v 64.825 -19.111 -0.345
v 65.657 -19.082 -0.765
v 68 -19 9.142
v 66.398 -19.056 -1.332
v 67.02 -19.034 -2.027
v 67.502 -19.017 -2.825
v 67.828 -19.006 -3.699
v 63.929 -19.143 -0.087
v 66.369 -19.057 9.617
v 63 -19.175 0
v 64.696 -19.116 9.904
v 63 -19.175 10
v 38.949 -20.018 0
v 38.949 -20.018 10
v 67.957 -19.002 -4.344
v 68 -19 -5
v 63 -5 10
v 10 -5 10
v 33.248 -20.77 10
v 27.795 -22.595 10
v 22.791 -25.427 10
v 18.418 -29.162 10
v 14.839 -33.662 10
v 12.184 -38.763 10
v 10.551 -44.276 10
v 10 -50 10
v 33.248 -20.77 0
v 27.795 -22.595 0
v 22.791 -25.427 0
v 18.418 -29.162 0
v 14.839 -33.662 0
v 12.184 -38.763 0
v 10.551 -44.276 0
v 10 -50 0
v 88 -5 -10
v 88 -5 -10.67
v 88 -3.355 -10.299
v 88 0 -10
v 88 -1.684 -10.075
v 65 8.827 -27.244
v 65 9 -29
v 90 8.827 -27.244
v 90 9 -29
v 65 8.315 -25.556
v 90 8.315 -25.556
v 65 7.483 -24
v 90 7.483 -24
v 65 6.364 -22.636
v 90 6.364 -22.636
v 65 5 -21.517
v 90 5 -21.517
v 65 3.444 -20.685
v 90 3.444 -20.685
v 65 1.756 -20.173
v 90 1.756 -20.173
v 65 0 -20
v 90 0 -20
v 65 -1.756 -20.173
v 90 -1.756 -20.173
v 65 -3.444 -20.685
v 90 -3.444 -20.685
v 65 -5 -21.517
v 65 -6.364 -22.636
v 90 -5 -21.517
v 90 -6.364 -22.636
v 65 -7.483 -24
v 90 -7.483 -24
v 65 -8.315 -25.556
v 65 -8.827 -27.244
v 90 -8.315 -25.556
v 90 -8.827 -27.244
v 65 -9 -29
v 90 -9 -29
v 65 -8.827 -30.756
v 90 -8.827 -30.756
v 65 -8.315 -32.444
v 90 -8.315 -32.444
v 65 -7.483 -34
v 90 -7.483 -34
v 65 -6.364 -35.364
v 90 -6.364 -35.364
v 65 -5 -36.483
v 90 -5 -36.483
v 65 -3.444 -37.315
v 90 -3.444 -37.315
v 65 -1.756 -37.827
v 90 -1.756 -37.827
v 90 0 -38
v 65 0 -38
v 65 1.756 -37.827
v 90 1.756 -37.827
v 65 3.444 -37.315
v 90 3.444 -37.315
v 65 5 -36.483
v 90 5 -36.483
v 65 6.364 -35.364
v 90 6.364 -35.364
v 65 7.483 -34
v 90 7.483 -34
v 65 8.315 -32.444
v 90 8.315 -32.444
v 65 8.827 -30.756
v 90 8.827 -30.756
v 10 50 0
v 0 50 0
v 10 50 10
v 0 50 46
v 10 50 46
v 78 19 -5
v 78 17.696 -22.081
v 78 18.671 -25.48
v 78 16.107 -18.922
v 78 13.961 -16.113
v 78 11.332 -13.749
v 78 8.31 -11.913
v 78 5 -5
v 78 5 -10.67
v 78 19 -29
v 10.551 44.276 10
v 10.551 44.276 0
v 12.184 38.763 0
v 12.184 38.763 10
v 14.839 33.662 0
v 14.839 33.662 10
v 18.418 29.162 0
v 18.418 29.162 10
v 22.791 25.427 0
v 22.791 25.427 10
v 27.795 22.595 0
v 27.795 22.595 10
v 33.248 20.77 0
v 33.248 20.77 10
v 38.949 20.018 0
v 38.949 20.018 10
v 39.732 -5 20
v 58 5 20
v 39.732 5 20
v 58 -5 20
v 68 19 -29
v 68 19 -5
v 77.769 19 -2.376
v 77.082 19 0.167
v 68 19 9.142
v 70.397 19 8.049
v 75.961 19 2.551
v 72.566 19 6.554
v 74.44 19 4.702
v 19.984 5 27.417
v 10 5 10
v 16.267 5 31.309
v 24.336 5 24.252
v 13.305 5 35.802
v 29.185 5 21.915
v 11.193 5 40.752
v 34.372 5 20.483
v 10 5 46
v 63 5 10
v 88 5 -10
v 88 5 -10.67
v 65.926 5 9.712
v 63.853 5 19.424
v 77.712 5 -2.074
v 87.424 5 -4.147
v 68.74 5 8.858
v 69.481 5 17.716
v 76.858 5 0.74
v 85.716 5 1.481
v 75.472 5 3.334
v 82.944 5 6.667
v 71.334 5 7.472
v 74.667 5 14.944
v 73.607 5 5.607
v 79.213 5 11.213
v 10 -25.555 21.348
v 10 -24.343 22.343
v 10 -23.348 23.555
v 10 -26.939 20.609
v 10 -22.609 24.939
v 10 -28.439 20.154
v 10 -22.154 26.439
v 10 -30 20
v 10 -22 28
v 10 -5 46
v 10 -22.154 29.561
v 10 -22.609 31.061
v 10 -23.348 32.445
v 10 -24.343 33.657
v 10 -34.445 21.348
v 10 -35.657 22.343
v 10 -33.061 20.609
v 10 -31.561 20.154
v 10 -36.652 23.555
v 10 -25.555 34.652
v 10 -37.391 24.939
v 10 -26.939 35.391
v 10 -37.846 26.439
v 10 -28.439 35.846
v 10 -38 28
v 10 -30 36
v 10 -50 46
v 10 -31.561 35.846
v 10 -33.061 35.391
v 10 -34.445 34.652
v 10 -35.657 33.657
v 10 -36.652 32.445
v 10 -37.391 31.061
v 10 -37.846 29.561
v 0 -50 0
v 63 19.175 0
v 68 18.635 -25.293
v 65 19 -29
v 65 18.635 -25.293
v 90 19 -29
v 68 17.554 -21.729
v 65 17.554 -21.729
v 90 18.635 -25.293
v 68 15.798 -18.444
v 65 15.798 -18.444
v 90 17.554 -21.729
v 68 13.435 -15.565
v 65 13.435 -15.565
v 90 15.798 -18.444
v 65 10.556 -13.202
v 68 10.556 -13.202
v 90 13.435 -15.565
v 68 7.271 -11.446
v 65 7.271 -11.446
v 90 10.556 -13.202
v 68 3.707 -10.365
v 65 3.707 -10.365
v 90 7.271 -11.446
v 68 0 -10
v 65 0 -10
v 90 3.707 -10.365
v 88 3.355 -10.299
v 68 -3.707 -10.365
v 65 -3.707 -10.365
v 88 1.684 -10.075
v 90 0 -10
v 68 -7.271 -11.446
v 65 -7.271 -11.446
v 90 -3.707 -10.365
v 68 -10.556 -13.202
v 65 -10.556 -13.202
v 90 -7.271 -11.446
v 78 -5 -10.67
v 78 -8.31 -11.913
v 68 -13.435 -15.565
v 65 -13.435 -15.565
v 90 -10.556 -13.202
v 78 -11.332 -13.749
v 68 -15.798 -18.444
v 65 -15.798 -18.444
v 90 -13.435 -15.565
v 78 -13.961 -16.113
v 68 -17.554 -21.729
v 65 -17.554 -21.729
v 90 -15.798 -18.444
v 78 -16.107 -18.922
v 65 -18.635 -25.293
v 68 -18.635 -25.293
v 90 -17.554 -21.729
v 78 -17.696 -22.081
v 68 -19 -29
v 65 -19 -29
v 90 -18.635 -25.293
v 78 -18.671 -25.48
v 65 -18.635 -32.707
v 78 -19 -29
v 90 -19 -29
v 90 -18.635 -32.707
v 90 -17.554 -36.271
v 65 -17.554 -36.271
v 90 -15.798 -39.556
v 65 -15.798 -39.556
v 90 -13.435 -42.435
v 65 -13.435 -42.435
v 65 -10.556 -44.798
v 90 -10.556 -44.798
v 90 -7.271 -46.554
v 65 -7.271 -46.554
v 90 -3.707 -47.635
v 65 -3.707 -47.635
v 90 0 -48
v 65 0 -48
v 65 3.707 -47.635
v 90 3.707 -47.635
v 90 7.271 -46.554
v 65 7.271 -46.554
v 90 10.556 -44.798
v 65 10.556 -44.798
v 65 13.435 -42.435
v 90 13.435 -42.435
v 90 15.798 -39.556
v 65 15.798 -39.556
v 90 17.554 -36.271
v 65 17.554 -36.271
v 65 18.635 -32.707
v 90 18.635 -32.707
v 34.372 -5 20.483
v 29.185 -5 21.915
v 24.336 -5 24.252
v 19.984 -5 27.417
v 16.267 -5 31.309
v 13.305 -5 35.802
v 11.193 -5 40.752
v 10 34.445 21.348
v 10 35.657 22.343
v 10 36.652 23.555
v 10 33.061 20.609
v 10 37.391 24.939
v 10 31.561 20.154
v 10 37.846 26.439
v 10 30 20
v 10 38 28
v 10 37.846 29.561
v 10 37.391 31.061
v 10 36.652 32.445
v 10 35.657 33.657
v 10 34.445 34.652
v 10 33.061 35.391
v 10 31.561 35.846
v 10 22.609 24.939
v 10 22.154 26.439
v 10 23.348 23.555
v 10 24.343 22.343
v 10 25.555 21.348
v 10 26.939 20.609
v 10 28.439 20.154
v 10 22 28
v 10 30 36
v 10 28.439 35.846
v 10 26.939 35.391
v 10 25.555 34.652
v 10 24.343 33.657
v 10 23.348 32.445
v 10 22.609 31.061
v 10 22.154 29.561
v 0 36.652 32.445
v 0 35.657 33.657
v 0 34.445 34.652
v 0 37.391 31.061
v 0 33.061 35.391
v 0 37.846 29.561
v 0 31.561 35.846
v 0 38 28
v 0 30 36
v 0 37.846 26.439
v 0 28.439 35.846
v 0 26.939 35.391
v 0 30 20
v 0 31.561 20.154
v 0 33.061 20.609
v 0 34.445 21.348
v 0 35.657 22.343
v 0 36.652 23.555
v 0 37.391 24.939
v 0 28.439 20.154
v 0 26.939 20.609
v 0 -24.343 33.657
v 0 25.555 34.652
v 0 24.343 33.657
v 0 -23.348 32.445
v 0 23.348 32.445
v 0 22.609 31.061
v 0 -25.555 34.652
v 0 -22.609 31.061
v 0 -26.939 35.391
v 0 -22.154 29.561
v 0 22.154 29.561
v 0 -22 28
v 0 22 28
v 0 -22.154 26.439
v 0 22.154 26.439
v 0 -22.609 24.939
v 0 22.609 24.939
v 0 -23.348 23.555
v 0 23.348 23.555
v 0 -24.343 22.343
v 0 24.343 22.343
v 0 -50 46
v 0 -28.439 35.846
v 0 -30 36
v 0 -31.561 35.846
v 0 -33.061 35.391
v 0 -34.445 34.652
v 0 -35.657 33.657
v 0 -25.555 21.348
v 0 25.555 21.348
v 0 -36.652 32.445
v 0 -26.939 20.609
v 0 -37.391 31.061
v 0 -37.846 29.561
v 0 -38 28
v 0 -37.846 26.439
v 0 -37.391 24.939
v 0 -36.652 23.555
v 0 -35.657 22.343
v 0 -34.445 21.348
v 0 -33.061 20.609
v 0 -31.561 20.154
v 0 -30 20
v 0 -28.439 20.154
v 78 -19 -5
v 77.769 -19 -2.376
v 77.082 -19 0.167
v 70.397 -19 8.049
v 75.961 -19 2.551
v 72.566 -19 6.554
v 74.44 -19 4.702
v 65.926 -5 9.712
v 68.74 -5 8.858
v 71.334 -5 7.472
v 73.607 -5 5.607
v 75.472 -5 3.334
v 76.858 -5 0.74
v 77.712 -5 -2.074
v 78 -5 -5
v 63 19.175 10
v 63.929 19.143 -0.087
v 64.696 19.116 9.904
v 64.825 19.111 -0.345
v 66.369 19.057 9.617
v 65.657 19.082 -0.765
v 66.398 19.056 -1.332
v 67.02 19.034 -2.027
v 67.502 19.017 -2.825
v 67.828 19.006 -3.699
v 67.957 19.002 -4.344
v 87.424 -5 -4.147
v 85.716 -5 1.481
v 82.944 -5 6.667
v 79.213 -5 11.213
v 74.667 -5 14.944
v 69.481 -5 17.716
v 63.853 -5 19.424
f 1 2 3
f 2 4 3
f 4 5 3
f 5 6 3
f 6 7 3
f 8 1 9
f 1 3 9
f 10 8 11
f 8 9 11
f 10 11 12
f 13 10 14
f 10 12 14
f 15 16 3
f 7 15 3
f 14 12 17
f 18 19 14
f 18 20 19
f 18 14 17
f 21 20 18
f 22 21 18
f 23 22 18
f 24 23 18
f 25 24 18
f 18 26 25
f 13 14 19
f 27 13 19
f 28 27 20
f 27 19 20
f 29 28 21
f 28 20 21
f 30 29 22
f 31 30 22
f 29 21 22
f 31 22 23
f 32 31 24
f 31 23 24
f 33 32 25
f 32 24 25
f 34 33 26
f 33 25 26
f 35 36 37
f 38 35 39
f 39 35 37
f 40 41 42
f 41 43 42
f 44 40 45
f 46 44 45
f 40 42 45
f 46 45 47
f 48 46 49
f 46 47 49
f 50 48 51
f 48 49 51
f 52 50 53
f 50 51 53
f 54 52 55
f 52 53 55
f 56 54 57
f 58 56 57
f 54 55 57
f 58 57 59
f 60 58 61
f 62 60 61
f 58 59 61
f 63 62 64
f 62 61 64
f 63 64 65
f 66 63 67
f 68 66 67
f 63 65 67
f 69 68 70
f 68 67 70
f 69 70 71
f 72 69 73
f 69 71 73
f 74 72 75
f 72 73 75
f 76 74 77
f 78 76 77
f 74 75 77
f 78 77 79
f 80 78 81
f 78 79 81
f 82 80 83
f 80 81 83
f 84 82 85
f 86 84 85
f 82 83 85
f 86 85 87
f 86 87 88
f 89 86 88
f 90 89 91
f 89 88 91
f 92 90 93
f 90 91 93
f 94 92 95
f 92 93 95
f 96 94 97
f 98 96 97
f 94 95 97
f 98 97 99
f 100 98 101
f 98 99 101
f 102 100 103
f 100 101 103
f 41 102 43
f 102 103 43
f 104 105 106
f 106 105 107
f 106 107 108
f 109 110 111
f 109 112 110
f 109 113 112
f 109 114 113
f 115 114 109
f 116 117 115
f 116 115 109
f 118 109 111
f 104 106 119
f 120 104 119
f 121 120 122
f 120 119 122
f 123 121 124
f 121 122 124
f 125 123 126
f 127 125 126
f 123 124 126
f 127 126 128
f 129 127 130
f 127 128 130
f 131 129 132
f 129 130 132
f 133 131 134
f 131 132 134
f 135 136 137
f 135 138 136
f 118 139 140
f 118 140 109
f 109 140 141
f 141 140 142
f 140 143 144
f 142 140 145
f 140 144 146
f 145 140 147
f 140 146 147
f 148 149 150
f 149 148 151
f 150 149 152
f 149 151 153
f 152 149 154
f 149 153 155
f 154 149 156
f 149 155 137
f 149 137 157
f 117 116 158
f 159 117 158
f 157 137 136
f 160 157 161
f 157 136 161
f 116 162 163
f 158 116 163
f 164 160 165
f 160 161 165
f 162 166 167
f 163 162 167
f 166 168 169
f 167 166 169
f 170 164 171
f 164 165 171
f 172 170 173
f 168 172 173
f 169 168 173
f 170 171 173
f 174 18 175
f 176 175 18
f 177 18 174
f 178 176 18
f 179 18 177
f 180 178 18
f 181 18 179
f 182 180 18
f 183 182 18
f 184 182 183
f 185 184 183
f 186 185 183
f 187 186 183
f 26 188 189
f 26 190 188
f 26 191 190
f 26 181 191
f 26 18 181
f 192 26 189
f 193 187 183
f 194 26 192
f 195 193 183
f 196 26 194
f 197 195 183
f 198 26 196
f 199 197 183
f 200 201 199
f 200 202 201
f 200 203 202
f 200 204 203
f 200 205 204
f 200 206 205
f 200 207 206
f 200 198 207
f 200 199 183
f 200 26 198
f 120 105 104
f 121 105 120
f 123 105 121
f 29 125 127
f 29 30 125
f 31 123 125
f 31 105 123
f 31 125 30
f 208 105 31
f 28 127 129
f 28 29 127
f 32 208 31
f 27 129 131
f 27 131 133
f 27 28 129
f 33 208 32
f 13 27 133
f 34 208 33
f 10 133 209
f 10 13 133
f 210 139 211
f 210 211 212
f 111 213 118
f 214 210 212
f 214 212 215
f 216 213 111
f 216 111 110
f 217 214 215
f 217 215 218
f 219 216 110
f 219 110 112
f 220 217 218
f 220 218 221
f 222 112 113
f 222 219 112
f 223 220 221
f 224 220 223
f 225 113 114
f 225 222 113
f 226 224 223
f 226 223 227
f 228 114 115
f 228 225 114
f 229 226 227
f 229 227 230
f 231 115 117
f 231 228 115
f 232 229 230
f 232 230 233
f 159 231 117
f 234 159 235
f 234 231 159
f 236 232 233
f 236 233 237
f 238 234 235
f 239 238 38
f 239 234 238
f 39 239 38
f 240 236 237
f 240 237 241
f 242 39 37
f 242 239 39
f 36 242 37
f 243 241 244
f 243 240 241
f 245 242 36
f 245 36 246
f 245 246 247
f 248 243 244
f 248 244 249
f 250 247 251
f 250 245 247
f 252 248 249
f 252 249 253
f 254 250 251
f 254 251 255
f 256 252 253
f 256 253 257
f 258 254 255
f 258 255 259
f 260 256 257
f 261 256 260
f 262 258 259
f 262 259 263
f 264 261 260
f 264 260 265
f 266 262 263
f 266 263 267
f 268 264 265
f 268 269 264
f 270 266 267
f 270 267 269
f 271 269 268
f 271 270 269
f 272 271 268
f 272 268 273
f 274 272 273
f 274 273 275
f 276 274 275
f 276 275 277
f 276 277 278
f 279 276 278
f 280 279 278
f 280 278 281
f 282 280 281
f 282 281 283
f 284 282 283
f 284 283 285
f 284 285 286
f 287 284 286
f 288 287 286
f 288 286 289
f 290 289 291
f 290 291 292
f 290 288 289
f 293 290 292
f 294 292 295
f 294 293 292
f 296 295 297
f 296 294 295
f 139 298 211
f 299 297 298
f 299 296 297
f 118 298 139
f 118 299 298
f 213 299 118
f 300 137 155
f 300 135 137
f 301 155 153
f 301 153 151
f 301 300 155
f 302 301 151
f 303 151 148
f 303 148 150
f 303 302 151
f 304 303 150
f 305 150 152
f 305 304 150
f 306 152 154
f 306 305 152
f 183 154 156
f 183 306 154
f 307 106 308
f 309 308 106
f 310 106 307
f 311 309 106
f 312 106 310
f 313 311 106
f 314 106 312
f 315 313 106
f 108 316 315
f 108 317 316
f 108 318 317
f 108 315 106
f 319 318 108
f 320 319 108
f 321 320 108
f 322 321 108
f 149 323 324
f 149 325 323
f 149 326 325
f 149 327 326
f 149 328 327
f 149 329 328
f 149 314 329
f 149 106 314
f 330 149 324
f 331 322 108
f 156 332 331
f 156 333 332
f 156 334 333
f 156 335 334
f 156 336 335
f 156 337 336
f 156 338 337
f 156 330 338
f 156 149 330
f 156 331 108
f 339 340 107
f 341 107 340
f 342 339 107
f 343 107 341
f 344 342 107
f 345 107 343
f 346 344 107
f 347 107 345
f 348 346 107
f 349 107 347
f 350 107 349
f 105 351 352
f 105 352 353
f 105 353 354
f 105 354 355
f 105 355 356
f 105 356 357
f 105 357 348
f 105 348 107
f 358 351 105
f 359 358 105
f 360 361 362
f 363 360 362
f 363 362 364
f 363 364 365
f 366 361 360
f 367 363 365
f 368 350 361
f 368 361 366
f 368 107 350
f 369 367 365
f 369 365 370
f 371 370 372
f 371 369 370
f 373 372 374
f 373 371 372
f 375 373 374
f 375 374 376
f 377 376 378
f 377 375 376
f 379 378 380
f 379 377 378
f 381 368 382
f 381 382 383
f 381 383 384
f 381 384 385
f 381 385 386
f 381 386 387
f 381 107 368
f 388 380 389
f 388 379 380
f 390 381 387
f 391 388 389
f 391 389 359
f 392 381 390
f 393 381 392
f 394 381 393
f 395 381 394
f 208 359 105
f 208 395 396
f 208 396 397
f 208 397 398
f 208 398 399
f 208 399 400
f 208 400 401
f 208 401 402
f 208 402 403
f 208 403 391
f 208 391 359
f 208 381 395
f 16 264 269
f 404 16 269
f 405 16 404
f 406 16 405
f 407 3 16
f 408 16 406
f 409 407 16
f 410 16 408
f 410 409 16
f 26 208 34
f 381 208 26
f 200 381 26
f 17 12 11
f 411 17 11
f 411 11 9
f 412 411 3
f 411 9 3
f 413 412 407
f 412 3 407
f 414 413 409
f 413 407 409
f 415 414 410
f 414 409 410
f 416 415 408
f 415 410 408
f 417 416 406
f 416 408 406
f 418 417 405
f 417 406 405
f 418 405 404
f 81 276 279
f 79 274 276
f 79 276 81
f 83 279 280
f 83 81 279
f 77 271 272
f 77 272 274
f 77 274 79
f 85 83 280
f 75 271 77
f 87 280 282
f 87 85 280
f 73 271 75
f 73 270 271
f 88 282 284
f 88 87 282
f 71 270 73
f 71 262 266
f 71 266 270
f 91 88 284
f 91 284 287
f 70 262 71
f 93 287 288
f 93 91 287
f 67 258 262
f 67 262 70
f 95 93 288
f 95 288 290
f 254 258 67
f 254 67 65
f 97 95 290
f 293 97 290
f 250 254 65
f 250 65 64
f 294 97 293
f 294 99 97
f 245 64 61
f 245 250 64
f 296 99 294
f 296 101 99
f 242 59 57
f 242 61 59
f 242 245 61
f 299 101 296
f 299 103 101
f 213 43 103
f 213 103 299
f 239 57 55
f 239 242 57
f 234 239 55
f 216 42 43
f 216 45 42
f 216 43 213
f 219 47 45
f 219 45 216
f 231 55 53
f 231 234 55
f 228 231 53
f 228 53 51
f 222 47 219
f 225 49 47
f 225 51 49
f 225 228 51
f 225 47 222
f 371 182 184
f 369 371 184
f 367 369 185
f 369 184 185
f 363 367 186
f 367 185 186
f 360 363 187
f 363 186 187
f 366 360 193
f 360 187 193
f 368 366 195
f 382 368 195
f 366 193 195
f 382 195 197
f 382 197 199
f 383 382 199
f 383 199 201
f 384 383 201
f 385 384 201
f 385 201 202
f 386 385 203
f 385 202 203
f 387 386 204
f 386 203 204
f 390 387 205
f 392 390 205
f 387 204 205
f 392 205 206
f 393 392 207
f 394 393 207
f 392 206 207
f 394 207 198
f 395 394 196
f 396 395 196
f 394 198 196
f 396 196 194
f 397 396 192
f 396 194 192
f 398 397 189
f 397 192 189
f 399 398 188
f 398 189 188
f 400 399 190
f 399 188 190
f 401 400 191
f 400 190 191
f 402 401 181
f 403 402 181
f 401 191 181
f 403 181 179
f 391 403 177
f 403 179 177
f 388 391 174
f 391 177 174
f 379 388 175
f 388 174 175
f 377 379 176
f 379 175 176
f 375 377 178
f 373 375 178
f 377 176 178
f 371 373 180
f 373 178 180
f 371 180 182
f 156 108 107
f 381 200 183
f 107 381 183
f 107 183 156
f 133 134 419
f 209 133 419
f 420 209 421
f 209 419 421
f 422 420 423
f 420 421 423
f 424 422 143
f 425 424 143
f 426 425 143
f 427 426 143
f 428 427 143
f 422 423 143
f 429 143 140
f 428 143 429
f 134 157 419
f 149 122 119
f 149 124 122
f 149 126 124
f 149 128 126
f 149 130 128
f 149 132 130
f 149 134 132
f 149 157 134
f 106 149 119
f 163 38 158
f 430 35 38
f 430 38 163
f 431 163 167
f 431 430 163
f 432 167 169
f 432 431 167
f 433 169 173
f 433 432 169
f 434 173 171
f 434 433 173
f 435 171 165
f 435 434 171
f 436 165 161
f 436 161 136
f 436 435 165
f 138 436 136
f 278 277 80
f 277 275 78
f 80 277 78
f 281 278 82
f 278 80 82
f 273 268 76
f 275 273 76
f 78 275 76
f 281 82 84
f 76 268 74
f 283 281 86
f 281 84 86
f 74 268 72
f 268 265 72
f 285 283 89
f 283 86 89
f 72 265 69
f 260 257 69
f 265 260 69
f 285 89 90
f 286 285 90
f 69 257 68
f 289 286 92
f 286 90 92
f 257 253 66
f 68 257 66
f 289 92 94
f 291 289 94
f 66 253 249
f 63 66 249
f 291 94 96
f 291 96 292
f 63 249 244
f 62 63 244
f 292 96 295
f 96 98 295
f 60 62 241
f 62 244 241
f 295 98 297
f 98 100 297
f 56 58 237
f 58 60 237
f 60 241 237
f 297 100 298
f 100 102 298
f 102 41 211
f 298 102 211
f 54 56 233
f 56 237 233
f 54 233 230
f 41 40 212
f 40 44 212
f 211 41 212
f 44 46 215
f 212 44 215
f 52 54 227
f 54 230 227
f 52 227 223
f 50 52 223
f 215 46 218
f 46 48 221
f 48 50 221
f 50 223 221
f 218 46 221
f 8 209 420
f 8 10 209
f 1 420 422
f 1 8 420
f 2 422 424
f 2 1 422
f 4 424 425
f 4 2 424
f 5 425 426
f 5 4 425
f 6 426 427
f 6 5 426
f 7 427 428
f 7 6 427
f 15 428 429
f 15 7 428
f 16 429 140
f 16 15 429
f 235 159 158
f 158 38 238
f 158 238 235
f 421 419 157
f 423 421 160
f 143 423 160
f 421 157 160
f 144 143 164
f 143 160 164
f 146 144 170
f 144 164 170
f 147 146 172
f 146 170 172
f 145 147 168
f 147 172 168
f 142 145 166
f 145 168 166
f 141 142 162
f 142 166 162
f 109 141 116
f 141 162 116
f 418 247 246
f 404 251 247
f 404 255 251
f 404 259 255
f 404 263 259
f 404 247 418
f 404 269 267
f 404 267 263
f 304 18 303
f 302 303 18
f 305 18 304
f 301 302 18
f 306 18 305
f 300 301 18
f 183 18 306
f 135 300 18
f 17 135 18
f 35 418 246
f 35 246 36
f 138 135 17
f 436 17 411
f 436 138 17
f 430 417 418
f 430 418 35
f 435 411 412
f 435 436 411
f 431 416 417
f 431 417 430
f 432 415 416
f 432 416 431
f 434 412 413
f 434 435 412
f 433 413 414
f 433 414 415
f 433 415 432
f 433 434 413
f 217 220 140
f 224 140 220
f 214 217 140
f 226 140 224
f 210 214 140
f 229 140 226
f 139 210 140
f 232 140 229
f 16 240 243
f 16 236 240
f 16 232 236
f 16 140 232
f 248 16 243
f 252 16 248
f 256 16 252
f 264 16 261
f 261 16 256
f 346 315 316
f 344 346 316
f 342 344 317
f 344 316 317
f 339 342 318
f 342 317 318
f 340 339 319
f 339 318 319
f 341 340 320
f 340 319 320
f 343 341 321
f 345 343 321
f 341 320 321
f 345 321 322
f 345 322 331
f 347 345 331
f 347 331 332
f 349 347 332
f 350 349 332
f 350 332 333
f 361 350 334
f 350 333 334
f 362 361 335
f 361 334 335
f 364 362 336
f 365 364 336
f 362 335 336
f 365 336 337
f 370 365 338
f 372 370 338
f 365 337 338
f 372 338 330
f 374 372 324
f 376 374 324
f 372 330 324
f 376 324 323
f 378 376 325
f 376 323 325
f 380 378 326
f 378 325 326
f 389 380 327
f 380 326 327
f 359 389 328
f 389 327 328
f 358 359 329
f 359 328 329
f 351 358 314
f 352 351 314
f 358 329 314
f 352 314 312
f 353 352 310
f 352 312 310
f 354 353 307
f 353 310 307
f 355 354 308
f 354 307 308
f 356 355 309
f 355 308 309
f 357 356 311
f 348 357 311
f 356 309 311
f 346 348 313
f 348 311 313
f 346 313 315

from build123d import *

# Parameters (mm, degrees)
F1_DEPTH  = 50
F2_DEPTH  = 19
F4_DEPTH  = 10
F5_R      = 5
F6_R      = 8
F7_DEPTH  = 10
F9_R      = 19
F9_R_2    = 9
F10_DEPTH = 25
F11_DEPTH = 25
F12_W     = 10
F12_H     = 19
F13_DEPTH = 5
F14_DEPTH = 25
F15_R     = 15


with BuildPart() as f1:
    # F0 (on Front) → F1 (new body, symmetric)
    with BuildSketch(Plane.XZ):
        Polygon((0, 46), (0, 0), (68, 0), (68, 10), (10, 10), (10, 46), align=None)
    extrude(amount=F1_DEPTH, both=True)

    # F0 (on Front) → F2 (join, symmetric)
    with BuildSketch(Plane.XZ):
        Polygon((0, 46), (0, 0), (68, 0), (68, 10), (10, 10), (10, 46), align=None)
        Polygon((68, 10), (68, 0), (68, -29), (78, -29), (78, 10), align=None)
    extrude(amount=F2_DEPTH, both=True)

    # F3 (on face) → F4 (cut, through all)
    with BuildSketch(Plane.XY.offset(10)):
        with BuildLine():
            ThreePointArc((38.9489616917, -20.0184170119), (18.418397311, -29.1617077145), (10, -50))
            Line((10, -50), (68, -50))
            Line((68, -50), (68, -19))
            Line((68, -19), (38.9489616917, -20.0184170119))
        make_face()
        with BuildLine():
            Line((68, 50), (10, 50))
            ThreePointArc((10, 50), (18.418397311, 29.1617077145), (38.9489616917, 20.0184170119))
            Line((38.9489616917, 20.0184170119), (68, 19))
            Line((68, 19), (68, 50))
        make_face()
    extrude(amount=-F4_DEPTH, mode=Mode.SUBTRACT)

    # F5
    f5_edges = [f1.edges().sort_by_distance(p)[0] for p in [
        (68, 0, 0),
    ]]
    fillet(f5_edges, radius=F5_R)

    # F6 (on face) → F7 (cut)
    with BuildSketch(Plane.YZ.offset(10)):
        with Locations((-30, 28)):
            Circle(F6_R)
        with Locations((30, 28)):
            Circle(F6_R)
    extrude(amount=-F7_DEPTH, mode=Mode.SUBTRACT)

    # F9 (on offset) → F10 (join)
    with BuildSketch(Plane.YZ.offset(90)):
        with Locations((0, -29)):
            Circle(F9_R)
        with Locations((0, -29)):
            Circle(F9_R_2, mode=Mode.SUBTRACT)
    extrude(amount=-F10_DEPTH)

    # F11 (cut): a face of the model
    f11_faces = [f1.faces().sort_by_distance(p)[0] for p in [
        (78, 0, -25.1802813658),
    ]]
    extrude(f11_faces, amount=-F11_DEPTH, mode=Mode.SUBTRACT)

    # F12 (on Front) → F13 (join, symmetric)
    with BuildSketch(Plane.XZ):
        with BuildLine():
            ThreePointArc((39.7321374946, 20), (19.9837198365, 27.4168204187), (10, 46))
            Line((10, 46), (10, 10))
            Line((10, 10), (38.9489616917, 10))
            Line((38.9489616917, 10), (68, 10))
            Line((68, 10), (73, 10))
            ThreePointArc((73, 10), (76.5355339059, 8.5355339059), (78, 5))
            Line((78, 5), (78, -10))
            Line((78, -10), (88, -10))
            ThreePointArc((88, -10), (79.2132034356, 11.2132034356), (58, 20))
            Line((58, 20), (39.7321374946, 20))
        make_face()
        with BuildLine():
            Line((73, 10), (68, 10))
            Line((68, 10), (68, -5))
            Line((68, -5), (68, -10))
            Line((68, -10), (78, -10))
            Line((78, -10), (78, 5))
            ThreePointArc((78, 5), (76.5355339059, 8.5355339059), (73, 10))
        make_face()
        with Locations((83, -19.5)):
            Rectangle(F12_W, F12_H)
        with Locations((73, -19.5)):
            Rectangle(F12_W, F12_H)
    extrude(amount=F13_DEPTH, both=True)

    # F14 (cut): a face of the model
    f14_faces = [f1.faces().sort_by_distance(p)[0] for p in [
        (88, 0, -24.7319215604),
    ]]
    extrude(f14_faces, amount=-F14_DEPTH, mode=Mode.SUBTRACT)

    # F15
    f15_edges = [f1.edges().sort_by_distance(p)[0] for p in [
        (78, -12, 10),
        (78, 12, 10),
    ]]
    fillet(f15_edges, radius=F15_R)


solid = f1.part
